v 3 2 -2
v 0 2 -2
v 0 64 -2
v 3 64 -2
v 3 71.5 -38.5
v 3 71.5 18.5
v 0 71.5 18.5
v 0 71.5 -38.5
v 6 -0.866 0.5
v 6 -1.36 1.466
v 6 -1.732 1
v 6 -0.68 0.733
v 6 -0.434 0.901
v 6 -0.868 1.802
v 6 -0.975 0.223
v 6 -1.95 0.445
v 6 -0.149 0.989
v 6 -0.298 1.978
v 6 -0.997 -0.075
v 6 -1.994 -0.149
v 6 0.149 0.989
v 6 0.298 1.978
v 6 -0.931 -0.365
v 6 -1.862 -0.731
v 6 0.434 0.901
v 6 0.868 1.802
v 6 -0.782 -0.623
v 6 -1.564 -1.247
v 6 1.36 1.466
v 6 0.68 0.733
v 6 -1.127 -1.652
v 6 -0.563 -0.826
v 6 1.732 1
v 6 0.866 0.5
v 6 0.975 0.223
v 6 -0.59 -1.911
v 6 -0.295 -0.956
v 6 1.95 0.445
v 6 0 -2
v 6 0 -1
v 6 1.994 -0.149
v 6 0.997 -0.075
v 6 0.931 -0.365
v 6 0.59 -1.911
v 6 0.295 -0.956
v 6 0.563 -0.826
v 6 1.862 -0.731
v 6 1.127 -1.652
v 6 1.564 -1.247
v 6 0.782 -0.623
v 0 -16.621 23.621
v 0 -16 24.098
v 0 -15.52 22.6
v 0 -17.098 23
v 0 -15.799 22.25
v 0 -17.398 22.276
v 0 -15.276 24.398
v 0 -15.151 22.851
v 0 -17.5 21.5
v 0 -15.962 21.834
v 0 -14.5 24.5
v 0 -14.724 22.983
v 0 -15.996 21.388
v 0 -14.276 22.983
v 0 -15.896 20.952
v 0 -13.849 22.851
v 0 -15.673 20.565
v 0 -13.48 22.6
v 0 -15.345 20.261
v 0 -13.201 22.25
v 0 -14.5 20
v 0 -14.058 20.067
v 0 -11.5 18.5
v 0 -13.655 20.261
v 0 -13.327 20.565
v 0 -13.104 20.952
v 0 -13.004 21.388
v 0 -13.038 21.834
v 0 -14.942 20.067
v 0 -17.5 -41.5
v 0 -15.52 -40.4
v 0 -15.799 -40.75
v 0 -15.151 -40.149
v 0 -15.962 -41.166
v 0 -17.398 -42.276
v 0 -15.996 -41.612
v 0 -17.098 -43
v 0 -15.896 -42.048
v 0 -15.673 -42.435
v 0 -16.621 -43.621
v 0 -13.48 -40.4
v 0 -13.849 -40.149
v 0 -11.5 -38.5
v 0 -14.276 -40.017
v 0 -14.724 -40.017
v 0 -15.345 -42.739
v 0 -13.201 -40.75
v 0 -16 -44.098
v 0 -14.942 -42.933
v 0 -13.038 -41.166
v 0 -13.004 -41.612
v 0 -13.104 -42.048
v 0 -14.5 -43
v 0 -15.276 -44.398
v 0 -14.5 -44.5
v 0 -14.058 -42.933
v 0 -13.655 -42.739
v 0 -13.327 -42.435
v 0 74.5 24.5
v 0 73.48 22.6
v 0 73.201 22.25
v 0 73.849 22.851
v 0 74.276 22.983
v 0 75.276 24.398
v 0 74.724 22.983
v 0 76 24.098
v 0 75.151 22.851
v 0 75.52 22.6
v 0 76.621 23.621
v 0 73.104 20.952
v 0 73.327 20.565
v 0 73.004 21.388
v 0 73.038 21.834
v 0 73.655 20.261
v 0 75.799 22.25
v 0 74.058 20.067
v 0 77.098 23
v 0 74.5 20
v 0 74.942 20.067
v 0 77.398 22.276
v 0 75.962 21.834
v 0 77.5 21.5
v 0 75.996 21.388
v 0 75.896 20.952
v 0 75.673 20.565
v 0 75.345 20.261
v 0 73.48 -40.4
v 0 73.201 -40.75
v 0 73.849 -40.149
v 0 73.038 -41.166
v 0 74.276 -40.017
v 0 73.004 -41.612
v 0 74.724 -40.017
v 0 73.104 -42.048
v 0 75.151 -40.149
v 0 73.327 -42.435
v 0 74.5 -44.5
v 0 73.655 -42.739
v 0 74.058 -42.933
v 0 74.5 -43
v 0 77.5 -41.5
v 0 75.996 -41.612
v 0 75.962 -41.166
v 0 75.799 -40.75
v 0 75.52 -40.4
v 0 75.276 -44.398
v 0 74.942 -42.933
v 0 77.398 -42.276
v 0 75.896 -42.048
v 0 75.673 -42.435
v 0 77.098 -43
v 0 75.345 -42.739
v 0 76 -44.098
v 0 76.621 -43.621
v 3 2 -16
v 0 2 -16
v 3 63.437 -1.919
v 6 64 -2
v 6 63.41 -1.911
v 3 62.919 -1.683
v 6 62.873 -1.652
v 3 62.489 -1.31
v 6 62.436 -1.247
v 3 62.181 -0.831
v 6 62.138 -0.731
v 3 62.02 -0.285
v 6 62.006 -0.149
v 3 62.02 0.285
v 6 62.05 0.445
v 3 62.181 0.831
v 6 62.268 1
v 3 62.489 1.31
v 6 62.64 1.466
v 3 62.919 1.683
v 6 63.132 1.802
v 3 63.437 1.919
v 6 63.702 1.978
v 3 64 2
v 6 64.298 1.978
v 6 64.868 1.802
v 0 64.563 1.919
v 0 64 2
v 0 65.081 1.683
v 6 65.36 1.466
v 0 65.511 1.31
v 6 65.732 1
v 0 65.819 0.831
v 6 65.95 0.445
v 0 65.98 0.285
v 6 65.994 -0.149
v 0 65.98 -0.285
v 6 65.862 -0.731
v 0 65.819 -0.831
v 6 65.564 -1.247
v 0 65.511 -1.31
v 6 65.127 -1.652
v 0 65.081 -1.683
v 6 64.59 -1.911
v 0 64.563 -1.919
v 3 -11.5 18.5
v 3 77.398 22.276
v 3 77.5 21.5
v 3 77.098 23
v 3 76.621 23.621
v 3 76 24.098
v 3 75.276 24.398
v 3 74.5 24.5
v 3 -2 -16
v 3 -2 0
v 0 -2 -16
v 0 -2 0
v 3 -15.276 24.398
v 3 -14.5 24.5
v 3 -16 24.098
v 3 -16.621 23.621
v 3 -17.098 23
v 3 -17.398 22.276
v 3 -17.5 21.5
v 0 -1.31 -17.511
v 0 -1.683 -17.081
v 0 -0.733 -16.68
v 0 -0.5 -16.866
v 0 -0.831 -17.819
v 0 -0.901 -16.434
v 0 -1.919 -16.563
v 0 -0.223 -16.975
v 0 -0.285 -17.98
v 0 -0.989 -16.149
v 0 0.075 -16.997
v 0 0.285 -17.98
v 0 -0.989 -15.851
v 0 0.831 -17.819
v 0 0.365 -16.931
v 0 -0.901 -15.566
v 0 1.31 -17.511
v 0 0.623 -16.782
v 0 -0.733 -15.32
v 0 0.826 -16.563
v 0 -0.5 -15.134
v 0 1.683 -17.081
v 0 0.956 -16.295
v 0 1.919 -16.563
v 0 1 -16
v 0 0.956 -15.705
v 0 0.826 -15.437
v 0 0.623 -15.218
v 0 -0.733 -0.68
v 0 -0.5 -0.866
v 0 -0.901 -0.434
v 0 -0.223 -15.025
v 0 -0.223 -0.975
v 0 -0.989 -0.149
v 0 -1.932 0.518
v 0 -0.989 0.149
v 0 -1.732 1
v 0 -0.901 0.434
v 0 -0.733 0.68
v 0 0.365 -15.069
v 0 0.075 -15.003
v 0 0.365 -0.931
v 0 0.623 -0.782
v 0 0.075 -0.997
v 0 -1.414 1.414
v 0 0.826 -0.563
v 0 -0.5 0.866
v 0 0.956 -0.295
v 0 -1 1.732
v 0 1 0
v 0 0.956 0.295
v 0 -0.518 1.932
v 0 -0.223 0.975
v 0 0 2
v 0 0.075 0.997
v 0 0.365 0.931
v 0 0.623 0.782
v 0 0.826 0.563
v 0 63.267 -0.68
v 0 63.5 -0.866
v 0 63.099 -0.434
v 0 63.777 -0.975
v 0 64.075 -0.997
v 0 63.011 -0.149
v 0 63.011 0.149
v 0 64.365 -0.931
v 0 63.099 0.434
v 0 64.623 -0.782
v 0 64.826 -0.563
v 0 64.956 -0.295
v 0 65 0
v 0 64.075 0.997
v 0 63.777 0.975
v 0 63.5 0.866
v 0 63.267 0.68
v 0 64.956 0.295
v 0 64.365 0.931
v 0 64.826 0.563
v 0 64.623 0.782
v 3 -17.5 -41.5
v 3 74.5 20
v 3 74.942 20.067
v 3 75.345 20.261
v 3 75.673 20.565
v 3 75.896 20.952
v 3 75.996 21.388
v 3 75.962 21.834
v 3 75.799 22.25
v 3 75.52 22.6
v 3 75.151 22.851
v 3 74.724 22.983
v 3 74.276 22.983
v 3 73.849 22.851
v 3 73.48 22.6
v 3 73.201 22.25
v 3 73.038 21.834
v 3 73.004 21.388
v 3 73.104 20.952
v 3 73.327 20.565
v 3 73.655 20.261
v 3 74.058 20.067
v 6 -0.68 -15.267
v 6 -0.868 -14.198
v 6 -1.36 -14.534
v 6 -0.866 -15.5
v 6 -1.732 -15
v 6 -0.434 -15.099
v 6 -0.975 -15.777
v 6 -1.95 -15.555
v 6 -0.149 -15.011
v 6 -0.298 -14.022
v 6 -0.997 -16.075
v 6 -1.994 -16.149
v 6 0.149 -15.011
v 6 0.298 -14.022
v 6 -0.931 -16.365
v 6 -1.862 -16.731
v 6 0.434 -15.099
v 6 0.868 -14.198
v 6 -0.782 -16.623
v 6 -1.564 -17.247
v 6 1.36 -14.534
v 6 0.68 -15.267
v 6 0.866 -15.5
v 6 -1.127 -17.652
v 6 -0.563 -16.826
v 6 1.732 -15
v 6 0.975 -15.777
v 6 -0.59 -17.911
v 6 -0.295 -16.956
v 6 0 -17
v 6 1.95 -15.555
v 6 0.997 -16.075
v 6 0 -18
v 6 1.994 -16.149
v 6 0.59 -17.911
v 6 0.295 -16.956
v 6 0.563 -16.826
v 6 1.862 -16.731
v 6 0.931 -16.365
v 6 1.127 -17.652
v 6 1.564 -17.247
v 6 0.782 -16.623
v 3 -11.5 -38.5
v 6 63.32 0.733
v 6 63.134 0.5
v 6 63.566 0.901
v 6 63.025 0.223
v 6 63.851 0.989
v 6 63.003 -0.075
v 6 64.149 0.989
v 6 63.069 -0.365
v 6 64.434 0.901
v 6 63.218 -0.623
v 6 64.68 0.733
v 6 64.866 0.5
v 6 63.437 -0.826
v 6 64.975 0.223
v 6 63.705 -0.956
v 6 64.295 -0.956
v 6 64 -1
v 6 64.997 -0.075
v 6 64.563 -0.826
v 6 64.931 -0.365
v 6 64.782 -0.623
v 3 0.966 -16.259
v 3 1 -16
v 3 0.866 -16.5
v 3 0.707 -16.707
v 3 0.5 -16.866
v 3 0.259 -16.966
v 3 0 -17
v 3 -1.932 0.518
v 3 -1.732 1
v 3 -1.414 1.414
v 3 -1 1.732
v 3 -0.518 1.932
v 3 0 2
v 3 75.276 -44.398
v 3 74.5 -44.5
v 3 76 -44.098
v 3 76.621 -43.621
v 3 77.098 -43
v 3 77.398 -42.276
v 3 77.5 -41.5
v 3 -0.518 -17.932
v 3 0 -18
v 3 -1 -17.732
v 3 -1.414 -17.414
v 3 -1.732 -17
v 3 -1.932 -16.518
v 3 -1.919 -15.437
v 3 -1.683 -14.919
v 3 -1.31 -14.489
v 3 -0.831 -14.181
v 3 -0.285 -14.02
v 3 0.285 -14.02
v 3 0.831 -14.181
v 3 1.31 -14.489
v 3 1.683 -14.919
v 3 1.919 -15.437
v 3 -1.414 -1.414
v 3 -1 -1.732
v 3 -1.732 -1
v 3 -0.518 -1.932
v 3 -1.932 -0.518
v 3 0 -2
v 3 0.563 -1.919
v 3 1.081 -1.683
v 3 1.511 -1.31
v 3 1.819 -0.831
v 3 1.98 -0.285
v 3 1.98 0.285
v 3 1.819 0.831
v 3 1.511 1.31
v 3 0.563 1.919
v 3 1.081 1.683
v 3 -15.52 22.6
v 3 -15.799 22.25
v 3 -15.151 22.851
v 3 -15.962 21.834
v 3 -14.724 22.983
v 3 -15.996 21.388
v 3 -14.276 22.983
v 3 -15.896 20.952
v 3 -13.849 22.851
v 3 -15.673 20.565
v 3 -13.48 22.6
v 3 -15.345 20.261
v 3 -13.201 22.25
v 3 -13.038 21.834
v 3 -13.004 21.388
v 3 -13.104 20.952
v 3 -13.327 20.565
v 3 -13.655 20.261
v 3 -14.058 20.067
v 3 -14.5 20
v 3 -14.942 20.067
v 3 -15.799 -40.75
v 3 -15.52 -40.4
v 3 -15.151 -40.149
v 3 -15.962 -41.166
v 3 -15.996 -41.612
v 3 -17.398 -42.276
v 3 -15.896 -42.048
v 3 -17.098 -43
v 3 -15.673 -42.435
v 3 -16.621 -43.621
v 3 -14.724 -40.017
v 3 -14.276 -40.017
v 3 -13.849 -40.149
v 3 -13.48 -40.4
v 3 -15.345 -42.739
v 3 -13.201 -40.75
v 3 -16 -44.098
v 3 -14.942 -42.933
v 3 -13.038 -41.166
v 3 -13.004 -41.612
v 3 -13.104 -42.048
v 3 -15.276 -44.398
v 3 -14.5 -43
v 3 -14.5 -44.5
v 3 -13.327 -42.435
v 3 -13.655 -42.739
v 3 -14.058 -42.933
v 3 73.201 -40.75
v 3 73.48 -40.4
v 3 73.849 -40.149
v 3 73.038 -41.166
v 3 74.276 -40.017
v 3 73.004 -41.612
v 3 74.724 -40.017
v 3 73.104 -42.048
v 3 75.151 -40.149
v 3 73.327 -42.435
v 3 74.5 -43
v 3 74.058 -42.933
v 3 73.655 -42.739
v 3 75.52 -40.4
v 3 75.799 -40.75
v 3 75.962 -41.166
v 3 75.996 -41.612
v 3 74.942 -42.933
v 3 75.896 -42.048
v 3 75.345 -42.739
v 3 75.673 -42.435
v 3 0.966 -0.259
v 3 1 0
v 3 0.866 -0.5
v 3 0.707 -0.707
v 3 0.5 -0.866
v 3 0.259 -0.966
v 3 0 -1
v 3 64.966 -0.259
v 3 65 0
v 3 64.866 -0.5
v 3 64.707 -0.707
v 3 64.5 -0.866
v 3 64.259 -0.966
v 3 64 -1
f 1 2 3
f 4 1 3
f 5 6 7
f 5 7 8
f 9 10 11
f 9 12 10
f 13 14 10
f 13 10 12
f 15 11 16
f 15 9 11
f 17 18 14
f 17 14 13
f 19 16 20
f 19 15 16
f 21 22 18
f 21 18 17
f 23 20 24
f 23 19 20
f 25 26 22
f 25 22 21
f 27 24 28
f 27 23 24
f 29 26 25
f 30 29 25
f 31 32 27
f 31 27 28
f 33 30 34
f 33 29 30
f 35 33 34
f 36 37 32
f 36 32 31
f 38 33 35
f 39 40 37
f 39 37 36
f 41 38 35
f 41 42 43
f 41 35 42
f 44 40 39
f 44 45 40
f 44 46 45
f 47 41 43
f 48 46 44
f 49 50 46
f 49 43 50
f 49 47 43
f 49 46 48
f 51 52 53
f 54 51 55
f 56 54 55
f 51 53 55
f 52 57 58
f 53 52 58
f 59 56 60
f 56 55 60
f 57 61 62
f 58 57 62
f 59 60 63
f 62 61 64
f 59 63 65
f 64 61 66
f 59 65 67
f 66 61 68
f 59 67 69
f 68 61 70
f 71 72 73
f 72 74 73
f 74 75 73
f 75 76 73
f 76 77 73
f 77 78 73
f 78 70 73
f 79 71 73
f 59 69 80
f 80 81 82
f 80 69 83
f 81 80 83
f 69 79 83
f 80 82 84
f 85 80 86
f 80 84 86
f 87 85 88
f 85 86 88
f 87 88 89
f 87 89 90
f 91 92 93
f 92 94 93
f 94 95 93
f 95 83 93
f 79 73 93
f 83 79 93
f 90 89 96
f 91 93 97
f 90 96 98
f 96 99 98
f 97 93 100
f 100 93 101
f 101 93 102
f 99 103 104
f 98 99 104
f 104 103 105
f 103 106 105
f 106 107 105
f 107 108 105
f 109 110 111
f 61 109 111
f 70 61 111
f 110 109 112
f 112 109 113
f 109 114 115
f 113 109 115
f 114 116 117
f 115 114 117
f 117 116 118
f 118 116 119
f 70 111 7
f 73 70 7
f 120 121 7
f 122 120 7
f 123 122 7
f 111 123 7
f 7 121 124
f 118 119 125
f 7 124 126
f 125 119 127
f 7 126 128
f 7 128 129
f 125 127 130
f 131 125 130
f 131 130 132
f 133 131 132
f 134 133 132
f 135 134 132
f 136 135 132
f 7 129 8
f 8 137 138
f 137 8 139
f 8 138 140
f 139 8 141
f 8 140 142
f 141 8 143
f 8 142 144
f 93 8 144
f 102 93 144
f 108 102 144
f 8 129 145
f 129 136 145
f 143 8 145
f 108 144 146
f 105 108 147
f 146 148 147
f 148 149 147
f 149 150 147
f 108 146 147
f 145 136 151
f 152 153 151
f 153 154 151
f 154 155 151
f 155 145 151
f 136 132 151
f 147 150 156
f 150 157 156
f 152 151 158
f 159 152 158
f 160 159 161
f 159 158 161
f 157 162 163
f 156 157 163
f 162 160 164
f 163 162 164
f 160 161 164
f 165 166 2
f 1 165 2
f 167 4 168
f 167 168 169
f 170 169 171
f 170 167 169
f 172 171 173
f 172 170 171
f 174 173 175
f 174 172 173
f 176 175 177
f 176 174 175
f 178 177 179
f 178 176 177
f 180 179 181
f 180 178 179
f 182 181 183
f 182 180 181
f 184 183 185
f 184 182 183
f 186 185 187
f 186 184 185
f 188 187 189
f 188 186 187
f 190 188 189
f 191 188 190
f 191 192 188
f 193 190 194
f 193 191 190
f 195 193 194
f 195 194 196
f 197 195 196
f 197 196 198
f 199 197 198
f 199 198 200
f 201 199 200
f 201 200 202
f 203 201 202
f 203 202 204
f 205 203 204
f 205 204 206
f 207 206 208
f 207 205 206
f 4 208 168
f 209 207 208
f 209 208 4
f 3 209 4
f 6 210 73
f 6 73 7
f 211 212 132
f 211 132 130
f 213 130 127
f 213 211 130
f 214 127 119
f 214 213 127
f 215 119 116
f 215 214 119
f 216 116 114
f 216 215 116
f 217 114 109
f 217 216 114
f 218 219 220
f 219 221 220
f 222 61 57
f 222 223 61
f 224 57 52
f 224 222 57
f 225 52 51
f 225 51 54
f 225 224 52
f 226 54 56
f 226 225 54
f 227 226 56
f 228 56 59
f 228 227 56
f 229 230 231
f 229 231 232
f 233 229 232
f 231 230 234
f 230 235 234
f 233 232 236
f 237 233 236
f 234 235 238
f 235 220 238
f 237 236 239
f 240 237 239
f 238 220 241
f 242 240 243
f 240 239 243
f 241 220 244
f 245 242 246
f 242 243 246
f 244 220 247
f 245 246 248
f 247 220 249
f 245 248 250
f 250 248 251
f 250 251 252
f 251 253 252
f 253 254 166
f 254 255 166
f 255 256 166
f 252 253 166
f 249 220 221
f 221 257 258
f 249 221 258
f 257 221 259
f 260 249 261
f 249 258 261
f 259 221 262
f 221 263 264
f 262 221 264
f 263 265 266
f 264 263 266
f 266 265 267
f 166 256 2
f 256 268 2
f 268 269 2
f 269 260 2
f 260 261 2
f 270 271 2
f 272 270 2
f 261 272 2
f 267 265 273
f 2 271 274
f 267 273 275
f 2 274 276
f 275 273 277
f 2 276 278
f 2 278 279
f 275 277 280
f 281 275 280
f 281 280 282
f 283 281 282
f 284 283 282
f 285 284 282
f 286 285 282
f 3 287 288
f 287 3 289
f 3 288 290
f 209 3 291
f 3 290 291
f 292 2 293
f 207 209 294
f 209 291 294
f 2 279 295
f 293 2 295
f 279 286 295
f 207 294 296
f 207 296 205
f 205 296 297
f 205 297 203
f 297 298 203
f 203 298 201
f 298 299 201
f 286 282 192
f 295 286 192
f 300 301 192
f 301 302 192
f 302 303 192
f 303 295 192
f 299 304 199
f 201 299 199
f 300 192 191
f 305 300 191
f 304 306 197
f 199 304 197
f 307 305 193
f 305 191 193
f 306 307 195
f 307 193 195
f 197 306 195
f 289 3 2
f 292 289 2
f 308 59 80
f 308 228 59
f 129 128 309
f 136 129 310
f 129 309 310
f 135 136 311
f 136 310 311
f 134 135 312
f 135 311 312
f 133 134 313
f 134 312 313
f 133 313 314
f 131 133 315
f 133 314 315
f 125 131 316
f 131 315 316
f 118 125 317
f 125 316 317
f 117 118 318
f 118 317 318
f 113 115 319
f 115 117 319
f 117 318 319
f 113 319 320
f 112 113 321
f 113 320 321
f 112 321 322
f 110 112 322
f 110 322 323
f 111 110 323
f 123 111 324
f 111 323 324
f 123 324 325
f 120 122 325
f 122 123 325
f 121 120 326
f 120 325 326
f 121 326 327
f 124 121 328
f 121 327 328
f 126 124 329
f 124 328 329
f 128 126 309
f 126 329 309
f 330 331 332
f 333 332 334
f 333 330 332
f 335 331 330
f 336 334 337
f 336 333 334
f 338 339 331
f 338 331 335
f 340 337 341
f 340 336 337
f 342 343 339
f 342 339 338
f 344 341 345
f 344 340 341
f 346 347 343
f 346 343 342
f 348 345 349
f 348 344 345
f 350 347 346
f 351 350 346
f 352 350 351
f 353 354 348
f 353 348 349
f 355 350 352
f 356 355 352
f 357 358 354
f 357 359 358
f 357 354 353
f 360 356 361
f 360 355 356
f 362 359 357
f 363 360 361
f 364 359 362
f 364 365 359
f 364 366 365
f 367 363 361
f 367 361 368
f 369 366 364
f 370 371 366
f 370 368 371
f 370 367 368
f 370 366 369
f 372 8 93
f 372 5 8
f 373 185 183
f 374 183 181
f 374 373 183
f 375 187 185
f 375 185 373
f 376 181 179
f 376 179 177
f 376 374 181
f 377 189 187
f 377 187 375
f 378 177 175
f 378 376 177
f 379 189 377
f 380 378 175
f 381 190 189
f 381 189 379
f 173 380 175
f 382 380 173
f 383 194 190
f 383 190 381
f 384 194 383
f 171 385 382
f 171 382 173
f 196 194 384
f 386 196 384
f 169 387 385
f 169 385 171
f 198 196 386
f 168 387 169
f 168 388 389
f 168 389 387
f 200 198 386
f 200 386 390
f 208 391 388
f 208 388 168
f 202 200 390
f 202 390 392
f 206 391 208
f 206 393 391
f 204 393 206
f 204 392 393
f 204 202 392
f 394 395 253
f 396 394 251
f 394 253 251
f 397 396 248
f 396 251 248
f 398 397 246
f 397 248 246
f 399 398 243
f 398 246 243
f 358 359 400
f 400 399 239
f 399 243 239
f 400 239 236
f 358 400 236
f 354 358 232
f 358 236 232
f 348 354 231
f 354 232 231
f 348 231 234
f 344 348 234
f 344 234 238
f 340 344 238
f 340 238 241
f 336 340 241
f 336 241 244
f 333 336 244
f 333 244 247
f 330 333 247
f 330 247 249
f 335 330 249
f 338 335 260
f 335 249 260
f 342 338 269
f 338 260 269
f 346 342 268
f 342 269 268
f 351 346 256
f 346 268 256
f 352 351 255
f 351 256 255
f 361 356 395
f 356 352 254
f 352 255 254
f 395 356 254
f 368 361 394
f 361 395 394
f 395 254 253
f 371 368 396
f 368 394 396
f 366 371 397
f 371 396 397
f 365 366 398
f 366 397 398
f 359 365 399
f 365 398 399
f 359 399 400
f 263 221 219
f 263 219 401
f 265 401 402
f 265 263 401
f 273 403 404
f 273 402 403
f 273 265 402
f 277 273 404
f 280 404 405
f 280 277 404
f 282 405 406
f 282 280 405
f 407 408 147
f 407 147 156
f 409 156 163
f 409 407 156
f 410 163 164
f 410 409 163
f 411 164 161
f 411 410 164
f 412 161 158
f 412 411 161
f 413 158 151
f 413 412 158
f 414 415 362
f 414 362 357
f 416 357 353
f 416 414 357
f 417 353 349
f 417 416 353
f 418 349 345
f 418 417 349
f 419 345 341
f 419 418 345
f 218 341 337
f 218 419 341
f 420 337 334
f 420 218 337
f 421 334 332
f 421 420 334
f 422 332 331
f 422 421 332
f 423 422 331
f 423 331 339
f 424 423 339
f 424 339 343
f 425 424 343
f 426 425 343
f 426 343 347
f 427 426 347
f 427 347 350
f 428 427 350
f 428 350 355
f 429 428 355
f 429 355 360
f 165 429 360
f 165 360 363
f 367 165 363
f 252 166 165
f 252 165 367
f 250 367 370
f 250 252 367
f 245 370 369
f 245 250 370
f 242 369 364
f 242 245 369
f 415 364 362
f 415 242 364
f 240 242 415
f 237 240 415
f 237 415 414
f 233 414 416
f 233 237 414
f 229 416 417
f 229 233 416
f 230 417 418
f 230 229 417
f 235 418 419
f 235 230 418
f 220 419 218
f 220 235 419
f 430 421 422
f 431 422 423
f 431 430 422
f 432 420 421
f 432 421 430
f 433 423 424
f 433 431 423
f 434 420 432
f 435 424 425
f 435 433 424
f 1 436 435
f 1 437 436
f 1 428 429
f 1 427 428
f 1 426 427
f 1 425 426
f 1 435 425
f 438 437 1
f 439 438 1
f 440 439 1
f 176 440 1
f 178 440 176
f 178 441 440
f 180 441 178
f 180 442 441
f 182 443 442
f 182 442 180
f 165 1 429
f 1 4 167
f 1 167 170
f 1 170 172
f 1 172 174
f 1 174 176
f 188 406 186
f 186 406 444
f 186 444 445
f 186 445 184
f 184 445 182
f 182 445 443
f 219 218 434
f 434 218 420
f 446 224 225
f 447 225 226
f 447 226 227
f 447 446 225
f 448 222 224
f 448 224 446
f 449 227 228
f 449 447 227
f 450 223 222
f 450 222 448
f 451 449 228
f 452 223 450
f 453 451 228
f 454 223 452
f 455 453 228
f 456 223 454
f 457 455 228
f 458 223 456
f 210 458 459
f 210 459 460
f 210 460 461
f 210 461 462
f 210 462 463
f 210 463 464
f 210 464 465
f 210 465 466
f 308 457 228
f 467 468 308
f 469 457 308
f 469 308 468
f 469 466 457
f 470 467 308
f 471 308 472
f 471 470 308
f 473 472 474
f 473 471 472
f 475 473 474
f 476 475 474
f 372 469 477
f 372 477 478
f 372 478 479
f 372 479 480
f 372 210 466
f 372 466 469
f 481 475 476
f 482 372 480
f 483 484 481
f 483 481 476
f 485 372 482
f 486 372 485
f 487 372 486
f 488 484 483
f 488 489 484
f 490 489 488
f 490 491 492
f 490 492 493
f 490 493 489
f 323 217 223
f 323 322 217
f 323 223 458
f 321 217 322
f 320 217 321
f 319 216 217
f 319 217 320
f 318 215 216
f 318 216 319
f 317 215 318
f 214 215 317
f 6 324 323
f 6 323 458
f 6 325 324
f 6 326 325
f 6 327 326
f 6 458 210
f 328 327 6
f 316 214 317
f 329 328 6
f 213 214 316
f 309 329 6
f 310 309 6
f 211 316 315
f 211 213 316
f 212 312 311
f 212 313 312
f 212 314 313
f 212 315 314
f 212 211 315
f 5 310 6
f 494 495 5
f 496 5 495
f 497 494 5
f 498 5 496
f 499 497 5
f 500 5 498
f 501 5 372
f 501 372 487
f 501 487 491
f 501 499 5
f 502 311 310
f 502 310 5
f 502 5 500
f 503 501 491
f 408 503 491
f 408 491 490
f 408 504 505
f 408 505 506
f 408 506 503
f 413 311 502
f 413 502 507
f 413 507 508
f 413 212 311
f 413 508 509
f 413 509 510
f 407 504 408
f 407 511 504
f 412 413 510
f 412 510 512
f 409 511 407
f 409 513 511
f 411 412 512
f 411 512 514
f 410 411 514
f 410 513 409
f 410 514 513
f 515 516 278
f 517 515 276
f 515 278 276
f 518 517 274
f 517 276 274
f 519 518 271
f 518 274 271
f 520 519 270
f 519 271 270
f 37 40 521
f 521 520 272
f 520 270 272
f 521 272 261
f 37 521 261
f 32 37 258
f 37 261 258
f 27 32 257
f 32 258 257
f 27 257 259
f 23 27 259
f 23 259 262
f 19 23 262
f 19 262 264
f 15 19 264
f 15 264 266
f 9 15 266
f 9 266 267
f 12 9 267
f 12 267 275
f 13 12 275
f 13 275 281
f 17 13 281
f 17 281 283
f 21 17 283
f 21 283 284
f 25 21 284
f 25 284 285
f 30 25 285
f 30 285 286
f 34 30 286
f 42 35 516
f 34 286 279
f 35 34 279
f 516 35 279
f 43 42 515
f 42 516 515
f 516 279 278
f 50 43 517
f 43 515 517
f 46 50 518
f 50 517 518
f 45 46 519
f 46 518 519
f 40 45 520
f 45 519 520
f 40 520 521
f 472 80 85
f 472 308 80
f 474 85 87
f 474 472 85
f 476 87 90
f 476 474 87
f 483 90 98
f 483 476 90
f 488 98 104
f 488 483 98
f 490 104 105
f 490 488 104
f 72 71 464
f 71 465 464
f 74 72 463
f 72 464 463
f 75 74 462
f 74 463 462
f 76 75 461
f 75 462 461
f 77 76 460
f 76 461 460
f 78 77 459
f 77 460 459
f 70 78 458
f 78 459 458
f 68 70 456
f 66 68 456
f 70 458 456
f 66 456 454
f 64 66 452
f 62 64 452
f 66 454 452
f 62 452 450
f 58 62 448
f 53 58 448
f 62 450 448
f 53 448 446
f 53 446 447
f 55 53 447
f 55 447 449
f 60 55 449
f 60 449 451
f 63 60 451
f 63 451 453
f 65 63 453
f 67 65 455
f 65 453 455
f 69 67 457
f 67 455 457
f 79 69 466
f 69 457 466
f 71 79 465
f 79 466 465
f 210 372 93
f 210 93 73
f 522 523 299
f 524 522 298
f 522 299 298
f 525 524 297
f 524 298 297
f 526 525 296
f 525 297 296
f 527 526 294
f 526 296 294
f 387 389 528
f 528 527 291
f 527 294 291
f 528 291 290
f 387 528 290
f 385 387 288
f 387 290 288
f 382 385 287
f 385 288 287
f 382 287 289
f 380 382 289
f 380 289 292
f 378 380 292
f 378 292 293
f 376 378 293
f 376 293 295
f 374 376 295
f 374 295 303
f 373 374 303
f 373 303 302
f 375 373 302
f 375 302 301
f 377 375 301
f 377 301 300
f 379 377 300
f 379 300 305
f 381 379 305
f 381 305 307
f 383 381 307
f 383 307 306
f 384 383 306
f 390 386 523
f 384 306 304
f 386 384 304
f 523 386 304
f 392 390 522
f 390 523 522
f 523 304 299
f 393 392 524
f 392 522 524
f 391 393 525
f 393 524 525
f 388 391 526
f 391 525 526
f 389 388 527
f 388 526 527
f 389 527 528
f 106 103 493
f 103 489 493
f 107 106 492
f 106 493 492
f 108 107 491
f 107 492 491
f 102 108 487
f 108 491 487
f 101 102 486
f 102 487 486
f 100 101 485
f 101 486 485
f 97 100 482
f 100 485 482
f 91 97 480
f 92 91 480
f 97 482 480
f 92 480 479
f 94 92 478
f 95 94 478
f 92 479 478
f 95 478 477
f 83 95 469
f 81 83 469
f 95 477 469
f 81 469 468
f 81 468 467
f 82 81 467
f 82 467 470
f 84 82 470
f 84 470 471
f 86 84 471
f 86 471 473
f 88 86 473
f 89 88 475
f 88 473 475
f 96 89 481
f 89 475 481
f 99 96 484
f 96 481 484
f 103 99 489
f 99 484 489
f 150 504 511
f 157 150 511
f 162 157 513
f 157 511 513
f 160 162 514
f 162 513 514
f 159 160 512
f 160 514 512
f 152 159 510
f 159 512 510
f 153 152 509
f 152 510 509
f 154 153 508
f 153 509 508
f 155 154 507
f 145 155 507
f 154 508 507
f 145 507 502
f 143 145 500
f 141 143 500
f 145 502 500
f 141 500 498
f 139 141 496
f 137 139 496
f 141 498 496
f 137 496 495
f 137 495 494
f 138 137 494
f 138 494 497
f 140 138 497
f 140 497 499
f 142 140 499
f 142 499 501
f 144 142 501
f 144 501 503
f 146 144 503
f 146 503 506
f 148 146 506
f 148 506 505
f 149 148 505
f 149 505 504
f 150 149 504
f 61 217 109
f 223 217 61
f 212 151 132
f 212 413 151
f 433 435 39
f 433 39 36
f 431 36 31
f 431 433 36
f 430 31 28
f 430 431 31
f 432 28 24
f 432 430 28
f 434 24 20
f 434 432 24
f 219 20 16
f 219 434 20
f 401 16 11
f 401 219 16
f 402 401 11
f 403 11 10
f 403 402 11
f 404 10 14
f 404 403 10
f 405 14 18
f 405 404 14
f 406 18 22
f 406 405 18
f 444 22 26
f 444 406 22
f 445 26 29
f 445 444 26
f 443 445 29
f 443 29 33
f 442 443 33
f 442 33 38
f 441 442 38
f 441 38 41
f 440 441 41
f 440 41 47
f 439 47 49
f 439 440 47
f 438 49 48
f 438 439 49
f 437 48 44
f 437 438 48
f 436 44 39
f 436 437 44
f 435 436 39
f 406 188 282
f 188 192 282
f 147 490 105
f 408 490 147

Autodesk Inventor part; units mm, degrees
ref_plane "YZ Plane" through (0, 0, 0) normal (1, 0, 0) x (0, 1, 0)
ref_plane "XZ Plane" through (0, 0, 0) normal (0, 1, 0) x (-1, 0, 0)
ref_plane "XY Plane" through (0, 0, 0) normal (0, 0, 1) x (1, 0, 0)
sketch "Sketch1" plane through (0, 0, 0) normal (1, 0, 0) x (0, 1, 0)
  line L0 (0, 0) -> (0, -16)
  circle A0 centre (0, 0) radius 1
  circle A1 centre (0, -16) radius 1
  line L1 (0, 0) -> (64, 0)
  circle A2 centre (64, 0) radius 1
  line L2 (64, 0) -> (0, 0) construction
  line L3 (64, 2) -> (0, 2)
  line L4 (0, -2) -> (64, -2)
  arc A3 (64, -2) -> (64, 2) centre (64, 0) ccw
  arc A4 (0, 2) -> (0, -2) centre (0, 0) ccw
  line L5 (0, 0) -> (0, -16) construction
  line L6 (-2, 0) -> (-2, -16)
  line L7 (2, -16) -> (2, 0)
  arc A5 (2, 0) -> (-2, 0) centre (0, 0) ccw
  arc A6 (-2, -16) -> (2, -16) centre (0, -16) ccw
  point P0 (32, 0)
  point P1 (0, -8)
  point P2 (2, -2)
  dimension "d0" = 16
  dimension "d1" = 2
  dimension "d2" = 2
  dimension "d3" = 64
  dimension "d4" = 2
  dimension "d5" = 4
  dimension "d6" = 4
extrude "Extrusion1" add sketch "Sketch1" along normal blind 3 contours A0 L1 L7 L4 L0 | L0 A4 A5 L1 A0 | L4 L7 A6 L6 A4 | A5 L3 A3 L4 L7
sketch "Sketch2" plane through (3, 0, 0) normal (1, 0, 0) x (0, 0, -1)
  circle A0 centre (0, 64) radius 1 projected
  circle A1 centre (0, 64) radius 1
  circle A2 centre (0, 64) radius 2
  circle A3 centre (0, 0) radius 1
  circle A4 centre (0, 0) radius 2
  circle A5 centre (16, 0) radius 1 projected
  circle A6 centre (16, 0) radius 1
  circle A7 centre (16, 0) radius 2
  dimension "d9" = 2
  dimension "d10" = 4
  dimension "d11" = 2
  dimension "d12" = 4
extrude "Extrusion2" add sketch "Sketch2" along normal blind 3
sketch "Sketch3" plane through (3, 0, 0) normal (1, 0, 0) x (0, 0, -1)
  arc A0 (0, -2) -> (-2, 0) centre (0, 0) ccw projected
  line L0 (0, 0) -> (0, 30)
  line L1 (0, 30) -> (10, 30)
  line L2 (-21.5, 74.5) -> (41.5, 74.5)
  line L3 (41.5, 74.5) -> (41.5, -14.5)
  line L4 (41.5, -14.5) -> (-21.5, -14.5)
  line L5 (-21.5, -14.5) -> (-21.5, 74.5)
  line L6 (-21.5, 74.5) -> (41.5, -14.5) construction
  line L7 (41.5, 74.5) -> (-21.5, -14.5) construction
  circle A1 centre (-21.5, 74.5) radius 1.5
  circle A2 centre (41.5, 74.5) radius 1.5
  circle A3 centre (41.5, -14.5) radius 1.5
  circle A4 centre (-21.5, -14.5) radius 1.5
  line L8 (-21.5, -14.5) -> (41.5, -14.5) construction
  line L9 (-21.5, -17.5) -> (41.5, -17.5)
  line L10 (41.5, -11.5) -> (-21.5, -11.5)
  arc A5 (-21.5, -11.5) -> (-21.5, -17.5) centre (-21.5, -14.5) ccw
  arc A6 (41.5, -17.5) -> (41.5, -11.5) centre (41.5, -14.5) ccw
  line L11 (41.5, -14.5) -> (41.5, 74.5) construction
  line L12 (44.5, -14.5) -> (44.5, 74.5)
  line L13 (38.5, 74.5) -> (38.5, -14.5)
  arc A7 (38.5, -14.5) -> (44.5, -14.5) centre (41.5, -14.5) ccw
  arc A8 (44.5, 74.5) -> (38.5, 74.5) centre (41.5, 74.5) ccw
  line L14 (41.5, 74.5) -> (-21.5, 74.5) construction
  line L15 (41.5, 77.5) -> (-21.5, 77.5)
  line L16 (-21.5, 71.5) -> (41.5, 71.5)
  arc A9 (41.5, 71.5) -> (41.5, 77.5) centre (41.5, 74.5) ccw
  arc A10 (-21.5, 77.5) -> (-21.5, 71.5) centre (-21.5, 74.5) ccw
  line L17 (-21.5, 74.5) -> (-21.5, -14.5) construction
  line L18 (-24.5, 74.5) -> (-24.5, -14.5)
  line L19 (-18.5, -14.5) -> (-18.5, 74.5)
  arc A11 (-18.5, 74.5) -> (-24.5, 74.5) centre (-21.5, 74.5) ccw
  arc A12 (-24.5, -14.5) -> (-18.5, -14.5) centre (-21.5, -14.5) ccw
  point P0 (10, -14.5)
  point P1 (41.5, 30)
  point P2 (10, 74.5)
  point P3 (-21.5, 30)
  point P4 (-18.5, -11.5)
  point P5 (-18.5, 71.5)
  point P6 (38.5, 71.5)
  point P7 (38.5, -11.5)
  dimension "d15" = 30
  dimension "d16" = 10
  dimension "d17" = 63
  dimension "d18" = 89
  dimension "d19" = 3
  dimension "d20" = 3
  dimension "d21" = 3
  dimension "d22" = 3
  dimension "d23" = 6
  dimension "d24" = 6
  dimension "d25" = 6
  dimension "d26" = 6
extrude "Extrusion3" add sketch "Sketch3" against normal blind 3 contours A1 L5 A10 A11 L2 | L2 L19 L16 L5 A1 | A11 L15 A8 L2 | L2 L13 L16 L19 | L16 L19 L10 L5 | L5 A5 L18 A10 | A8 A9 L3 A2 L2 | L2 A2 L3 L16 L13 | L10 L19 L4 A4 L5 | L5 A4 L4 A12 A5 | L16 L3 L10 L13 | L10 L13 L4 L19 | L10 L3 A3 L4 L13 | A9 L12 A6 L3 | L4 A7 L9 A12 | A6 A7 L4 A3 L3
properties part number "servo_drever_support"
